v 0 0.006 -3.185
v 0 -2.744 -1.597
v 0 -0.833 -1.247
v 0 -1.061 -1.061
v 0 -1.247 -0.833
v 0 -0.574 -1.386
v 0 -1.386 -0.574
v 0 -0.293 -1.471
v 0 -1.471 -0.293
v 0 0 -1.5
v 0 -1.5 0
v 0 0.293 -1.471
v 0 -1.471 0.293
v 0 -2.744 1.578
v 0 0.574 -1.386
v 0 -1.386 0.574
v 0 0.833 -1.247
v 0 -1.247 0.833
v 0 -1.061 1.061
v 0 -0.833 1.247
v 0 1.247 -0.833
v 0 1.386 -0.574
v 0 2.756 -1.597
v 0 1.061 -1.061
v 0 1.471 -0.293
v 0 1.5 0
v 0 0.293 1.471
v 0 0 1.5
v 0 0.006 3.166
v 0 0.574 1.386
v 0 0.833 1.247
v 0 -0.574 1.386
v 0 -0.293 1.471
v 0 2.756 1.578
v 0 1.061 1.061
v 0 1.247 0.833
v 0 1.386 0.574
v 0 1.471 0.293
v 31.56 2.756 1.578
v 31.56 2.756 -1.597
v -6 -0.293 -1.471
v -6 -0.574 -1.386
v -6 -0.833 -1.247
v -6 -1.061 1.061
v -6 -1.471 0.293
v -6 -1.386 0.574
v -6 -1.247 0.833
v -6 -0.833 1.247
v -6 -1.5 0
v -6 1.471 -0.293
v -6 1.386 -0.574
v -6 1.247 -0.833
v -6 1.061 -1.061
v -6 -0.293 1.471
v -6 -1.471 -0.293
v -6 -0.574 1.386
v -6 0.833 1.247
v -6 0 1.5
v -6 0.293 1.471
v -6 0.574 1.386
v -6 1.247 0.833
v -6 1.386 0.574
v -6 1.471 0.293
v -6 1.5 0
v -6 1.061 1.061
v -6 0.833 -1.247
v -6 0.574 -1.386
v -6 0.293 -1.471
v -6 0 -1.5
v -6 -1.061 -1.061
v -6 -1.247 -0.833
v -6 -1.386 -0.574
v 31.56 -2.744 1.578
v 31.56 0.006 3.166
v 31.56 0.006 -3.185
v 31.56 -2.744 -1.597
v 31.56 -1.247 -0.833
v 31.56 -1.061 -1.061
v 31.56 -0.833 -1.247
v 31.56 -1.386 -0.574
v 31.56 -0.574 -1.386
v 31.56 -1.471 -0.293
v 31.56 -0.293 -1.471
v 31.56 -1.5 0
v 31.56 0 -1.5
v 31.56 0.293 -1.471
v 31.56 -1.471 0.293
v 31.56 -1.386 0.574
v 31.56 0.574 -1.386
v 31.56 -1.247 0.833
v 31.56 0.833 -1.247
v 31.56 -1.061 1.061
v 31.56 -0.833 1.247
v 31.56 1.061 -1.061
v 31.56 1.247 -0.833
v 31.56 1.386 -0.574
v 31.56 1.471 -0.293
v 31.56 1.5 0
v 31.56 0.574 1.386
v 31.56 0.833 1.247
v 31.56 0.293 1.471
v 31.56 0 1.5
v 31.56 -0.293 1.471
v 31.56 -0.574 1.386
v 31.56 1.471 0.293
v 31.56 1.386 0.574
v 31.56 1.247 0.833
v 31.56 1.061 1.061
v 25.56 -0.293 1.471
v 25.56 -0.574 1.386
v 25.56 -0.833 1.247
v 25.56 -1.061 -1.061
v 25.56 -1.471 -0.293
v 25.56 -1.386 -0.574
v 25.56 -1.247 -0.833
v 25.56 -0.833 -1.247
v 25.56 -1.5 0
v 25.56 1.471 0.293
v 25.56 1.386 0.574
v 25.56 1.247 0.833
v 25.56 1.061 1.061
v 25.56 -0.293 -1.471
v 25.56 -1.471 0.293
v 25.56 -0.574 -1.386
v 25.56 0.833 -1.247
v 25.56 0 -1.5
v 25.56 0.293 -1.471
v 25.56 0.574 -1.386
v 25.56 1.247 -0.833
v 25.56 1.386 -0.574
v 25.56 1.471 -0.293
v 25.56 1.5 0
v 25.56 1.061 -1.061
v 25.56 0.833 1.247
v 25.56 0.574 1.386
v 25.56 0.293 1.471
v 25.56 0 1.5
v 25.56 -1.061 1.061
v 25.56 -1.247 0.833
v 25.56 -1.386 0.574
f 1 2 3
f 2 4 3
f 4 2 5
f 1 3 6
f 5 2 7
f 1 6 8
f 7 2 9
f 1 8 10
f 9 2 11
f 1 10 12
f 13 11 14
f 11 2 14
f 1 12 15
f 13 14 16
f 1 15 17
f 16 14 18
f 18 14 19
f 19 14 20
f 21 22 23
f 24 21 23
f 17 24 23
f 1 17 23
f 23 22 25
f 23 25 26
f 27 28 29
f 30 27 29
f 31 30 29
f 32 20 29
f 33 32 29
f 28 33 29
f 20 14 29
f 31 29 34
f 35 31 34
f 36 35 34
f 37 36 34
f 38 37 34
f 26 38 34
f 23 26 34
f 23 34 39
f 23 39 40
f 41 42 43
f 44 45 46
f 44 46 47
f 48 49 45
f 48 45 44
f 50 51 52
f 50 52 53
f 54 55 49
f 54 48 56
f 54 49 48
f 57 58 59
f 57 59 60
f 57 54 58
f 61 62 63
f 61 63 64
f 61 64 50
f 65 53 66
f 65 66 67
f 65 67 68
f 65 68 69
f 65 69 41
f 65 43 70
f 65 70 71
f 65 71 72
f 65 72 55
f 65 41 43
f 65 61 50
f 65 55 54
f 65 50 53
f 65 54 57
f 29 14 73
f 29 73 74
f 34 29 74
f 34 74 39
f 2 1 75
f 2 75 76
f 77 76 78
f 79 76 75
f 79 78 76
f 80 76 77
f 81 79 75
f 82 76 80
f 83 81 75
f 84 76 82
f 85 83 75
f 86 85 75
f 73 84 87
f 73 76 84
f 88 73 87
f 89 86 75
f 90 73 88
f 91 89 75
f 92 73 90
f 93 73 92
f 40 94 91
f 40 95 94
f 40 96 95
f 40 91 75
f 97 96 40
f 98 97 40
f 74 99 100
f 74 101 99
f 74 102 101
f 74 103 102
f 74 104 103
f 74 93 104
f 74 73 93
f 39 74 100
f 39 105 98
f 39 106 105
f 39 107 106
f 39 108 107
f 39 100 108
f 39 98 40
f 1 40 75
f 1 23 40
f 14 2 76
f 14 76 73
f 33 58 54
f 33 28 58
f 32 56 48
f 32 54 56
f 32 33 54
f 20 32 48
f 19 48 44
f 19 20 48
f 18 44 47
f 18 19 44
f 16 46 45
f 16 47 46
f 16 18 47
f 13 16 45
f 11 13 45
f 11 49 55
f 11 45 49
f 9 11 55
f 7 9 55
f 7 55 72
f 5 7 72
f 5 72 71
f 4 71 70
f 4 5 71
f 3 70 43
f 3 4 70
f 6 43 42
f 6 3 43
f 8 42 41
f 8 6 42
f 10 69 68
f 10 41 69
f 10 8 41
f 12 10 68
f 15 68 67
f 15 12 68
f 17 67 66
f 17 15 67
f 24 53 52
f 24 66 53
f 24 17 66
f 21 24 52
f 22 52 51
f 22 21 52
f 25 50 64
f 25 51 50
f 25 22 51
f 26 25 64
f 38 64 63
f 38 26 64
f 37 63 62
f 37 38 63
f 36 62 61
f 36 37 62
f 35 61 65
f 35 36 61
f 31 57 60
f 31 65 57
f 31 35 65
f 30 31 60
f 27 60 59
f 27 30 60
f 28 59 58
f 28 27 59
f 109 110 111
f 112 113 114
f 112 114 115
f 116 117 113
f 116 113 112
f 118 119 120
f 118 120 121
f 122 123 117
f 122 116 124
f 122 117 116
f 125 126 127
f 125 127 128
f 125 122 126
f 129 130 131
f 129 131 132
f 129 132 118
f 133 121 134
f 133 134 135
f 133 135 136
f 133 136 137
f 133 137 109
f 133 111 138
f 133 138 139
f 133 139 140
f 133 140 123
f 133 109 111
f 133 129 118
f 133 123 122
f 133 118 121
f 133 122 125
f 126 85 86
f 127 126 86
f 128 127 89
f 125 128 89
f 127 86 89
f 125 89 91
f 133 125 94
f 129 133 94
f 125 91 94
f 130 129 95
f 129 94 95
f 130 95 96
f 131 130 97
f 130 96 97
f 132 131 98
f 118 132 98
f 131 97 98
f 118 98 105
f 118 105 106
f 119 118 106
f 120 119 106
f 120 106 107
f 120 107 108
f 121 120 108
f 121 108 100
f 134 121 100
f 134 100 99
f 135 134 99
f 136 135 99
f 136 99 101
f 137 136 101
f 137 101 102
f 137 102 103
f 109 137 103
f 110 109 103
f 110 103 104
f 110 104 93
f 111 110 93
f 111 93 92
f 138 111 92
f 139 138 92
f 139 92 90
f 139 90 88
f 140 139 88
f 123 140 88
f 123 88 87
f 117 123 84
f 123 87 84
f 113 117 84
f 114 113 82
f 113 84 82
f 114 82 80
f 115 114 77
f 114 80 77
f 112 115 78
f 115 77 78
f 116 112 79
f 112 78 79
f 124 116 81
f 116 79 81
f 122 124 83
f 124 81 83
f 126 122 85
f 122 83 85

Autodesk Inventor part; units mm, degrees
ref_plane "YZ Plane" through (0, 0, 0) normal (1, 0, 0) x (0, 1, 0)
ref_plane "XZ Plane" through (0, 0, 0) normal (0, 1, 0) x (-1, 0, 0)
ref_plane "XY Plane" through (0, 0, 0) normal (0, 0, 1) x (1, 0, 0)
sketch "Sketch1" plane through (0, 0, 0) normal (1, 0, 0) x (0, 1, 0)
  line L0 (0.0055, 3.1659) -> (2.7555, 1.5782)
  line L1 (2.7555, 1.5782) -> (2.7555, -1.5973)
  line L2 (2.7555, -1.5973) -> (0.0055, -3.185)
  line L3 (0.0055, -3.185) -> (-2.7445, -1.5973)
  line L4 (-2.7445, -1.5973) -> (-2.7445, 1.5782)
  line L5 (-2.7445, 1.5782) -> (0.0055, 3.1659)
  point P0 (0.0055, -0.0095)
  dimension "d1" = 5.5
extrude "Extrusion1" add sketch "Sketch1" along normal blind 31.56
sketch "Sketch2" plane through (0, 0, 0) normal (-1, 0, 0) x (0, 0, 1)
  circle A0 centre (0, 0) radius 1.5
  dimension "d4" = 3
extrude "Extrusion2" add sketch "Sketch2" along normal blind 6
sketch "Sketch3" plane through (31.56, 0, 0) normal (1, 0, 0) x (0, 0, -1)
  circle A0 centre (0, 0) radius 1.5
  dimension "d7" = 3
extrude "Extrusion3" cut sketch "Sketch3" against normal blind 6
properties part number "UpperSpacer"
